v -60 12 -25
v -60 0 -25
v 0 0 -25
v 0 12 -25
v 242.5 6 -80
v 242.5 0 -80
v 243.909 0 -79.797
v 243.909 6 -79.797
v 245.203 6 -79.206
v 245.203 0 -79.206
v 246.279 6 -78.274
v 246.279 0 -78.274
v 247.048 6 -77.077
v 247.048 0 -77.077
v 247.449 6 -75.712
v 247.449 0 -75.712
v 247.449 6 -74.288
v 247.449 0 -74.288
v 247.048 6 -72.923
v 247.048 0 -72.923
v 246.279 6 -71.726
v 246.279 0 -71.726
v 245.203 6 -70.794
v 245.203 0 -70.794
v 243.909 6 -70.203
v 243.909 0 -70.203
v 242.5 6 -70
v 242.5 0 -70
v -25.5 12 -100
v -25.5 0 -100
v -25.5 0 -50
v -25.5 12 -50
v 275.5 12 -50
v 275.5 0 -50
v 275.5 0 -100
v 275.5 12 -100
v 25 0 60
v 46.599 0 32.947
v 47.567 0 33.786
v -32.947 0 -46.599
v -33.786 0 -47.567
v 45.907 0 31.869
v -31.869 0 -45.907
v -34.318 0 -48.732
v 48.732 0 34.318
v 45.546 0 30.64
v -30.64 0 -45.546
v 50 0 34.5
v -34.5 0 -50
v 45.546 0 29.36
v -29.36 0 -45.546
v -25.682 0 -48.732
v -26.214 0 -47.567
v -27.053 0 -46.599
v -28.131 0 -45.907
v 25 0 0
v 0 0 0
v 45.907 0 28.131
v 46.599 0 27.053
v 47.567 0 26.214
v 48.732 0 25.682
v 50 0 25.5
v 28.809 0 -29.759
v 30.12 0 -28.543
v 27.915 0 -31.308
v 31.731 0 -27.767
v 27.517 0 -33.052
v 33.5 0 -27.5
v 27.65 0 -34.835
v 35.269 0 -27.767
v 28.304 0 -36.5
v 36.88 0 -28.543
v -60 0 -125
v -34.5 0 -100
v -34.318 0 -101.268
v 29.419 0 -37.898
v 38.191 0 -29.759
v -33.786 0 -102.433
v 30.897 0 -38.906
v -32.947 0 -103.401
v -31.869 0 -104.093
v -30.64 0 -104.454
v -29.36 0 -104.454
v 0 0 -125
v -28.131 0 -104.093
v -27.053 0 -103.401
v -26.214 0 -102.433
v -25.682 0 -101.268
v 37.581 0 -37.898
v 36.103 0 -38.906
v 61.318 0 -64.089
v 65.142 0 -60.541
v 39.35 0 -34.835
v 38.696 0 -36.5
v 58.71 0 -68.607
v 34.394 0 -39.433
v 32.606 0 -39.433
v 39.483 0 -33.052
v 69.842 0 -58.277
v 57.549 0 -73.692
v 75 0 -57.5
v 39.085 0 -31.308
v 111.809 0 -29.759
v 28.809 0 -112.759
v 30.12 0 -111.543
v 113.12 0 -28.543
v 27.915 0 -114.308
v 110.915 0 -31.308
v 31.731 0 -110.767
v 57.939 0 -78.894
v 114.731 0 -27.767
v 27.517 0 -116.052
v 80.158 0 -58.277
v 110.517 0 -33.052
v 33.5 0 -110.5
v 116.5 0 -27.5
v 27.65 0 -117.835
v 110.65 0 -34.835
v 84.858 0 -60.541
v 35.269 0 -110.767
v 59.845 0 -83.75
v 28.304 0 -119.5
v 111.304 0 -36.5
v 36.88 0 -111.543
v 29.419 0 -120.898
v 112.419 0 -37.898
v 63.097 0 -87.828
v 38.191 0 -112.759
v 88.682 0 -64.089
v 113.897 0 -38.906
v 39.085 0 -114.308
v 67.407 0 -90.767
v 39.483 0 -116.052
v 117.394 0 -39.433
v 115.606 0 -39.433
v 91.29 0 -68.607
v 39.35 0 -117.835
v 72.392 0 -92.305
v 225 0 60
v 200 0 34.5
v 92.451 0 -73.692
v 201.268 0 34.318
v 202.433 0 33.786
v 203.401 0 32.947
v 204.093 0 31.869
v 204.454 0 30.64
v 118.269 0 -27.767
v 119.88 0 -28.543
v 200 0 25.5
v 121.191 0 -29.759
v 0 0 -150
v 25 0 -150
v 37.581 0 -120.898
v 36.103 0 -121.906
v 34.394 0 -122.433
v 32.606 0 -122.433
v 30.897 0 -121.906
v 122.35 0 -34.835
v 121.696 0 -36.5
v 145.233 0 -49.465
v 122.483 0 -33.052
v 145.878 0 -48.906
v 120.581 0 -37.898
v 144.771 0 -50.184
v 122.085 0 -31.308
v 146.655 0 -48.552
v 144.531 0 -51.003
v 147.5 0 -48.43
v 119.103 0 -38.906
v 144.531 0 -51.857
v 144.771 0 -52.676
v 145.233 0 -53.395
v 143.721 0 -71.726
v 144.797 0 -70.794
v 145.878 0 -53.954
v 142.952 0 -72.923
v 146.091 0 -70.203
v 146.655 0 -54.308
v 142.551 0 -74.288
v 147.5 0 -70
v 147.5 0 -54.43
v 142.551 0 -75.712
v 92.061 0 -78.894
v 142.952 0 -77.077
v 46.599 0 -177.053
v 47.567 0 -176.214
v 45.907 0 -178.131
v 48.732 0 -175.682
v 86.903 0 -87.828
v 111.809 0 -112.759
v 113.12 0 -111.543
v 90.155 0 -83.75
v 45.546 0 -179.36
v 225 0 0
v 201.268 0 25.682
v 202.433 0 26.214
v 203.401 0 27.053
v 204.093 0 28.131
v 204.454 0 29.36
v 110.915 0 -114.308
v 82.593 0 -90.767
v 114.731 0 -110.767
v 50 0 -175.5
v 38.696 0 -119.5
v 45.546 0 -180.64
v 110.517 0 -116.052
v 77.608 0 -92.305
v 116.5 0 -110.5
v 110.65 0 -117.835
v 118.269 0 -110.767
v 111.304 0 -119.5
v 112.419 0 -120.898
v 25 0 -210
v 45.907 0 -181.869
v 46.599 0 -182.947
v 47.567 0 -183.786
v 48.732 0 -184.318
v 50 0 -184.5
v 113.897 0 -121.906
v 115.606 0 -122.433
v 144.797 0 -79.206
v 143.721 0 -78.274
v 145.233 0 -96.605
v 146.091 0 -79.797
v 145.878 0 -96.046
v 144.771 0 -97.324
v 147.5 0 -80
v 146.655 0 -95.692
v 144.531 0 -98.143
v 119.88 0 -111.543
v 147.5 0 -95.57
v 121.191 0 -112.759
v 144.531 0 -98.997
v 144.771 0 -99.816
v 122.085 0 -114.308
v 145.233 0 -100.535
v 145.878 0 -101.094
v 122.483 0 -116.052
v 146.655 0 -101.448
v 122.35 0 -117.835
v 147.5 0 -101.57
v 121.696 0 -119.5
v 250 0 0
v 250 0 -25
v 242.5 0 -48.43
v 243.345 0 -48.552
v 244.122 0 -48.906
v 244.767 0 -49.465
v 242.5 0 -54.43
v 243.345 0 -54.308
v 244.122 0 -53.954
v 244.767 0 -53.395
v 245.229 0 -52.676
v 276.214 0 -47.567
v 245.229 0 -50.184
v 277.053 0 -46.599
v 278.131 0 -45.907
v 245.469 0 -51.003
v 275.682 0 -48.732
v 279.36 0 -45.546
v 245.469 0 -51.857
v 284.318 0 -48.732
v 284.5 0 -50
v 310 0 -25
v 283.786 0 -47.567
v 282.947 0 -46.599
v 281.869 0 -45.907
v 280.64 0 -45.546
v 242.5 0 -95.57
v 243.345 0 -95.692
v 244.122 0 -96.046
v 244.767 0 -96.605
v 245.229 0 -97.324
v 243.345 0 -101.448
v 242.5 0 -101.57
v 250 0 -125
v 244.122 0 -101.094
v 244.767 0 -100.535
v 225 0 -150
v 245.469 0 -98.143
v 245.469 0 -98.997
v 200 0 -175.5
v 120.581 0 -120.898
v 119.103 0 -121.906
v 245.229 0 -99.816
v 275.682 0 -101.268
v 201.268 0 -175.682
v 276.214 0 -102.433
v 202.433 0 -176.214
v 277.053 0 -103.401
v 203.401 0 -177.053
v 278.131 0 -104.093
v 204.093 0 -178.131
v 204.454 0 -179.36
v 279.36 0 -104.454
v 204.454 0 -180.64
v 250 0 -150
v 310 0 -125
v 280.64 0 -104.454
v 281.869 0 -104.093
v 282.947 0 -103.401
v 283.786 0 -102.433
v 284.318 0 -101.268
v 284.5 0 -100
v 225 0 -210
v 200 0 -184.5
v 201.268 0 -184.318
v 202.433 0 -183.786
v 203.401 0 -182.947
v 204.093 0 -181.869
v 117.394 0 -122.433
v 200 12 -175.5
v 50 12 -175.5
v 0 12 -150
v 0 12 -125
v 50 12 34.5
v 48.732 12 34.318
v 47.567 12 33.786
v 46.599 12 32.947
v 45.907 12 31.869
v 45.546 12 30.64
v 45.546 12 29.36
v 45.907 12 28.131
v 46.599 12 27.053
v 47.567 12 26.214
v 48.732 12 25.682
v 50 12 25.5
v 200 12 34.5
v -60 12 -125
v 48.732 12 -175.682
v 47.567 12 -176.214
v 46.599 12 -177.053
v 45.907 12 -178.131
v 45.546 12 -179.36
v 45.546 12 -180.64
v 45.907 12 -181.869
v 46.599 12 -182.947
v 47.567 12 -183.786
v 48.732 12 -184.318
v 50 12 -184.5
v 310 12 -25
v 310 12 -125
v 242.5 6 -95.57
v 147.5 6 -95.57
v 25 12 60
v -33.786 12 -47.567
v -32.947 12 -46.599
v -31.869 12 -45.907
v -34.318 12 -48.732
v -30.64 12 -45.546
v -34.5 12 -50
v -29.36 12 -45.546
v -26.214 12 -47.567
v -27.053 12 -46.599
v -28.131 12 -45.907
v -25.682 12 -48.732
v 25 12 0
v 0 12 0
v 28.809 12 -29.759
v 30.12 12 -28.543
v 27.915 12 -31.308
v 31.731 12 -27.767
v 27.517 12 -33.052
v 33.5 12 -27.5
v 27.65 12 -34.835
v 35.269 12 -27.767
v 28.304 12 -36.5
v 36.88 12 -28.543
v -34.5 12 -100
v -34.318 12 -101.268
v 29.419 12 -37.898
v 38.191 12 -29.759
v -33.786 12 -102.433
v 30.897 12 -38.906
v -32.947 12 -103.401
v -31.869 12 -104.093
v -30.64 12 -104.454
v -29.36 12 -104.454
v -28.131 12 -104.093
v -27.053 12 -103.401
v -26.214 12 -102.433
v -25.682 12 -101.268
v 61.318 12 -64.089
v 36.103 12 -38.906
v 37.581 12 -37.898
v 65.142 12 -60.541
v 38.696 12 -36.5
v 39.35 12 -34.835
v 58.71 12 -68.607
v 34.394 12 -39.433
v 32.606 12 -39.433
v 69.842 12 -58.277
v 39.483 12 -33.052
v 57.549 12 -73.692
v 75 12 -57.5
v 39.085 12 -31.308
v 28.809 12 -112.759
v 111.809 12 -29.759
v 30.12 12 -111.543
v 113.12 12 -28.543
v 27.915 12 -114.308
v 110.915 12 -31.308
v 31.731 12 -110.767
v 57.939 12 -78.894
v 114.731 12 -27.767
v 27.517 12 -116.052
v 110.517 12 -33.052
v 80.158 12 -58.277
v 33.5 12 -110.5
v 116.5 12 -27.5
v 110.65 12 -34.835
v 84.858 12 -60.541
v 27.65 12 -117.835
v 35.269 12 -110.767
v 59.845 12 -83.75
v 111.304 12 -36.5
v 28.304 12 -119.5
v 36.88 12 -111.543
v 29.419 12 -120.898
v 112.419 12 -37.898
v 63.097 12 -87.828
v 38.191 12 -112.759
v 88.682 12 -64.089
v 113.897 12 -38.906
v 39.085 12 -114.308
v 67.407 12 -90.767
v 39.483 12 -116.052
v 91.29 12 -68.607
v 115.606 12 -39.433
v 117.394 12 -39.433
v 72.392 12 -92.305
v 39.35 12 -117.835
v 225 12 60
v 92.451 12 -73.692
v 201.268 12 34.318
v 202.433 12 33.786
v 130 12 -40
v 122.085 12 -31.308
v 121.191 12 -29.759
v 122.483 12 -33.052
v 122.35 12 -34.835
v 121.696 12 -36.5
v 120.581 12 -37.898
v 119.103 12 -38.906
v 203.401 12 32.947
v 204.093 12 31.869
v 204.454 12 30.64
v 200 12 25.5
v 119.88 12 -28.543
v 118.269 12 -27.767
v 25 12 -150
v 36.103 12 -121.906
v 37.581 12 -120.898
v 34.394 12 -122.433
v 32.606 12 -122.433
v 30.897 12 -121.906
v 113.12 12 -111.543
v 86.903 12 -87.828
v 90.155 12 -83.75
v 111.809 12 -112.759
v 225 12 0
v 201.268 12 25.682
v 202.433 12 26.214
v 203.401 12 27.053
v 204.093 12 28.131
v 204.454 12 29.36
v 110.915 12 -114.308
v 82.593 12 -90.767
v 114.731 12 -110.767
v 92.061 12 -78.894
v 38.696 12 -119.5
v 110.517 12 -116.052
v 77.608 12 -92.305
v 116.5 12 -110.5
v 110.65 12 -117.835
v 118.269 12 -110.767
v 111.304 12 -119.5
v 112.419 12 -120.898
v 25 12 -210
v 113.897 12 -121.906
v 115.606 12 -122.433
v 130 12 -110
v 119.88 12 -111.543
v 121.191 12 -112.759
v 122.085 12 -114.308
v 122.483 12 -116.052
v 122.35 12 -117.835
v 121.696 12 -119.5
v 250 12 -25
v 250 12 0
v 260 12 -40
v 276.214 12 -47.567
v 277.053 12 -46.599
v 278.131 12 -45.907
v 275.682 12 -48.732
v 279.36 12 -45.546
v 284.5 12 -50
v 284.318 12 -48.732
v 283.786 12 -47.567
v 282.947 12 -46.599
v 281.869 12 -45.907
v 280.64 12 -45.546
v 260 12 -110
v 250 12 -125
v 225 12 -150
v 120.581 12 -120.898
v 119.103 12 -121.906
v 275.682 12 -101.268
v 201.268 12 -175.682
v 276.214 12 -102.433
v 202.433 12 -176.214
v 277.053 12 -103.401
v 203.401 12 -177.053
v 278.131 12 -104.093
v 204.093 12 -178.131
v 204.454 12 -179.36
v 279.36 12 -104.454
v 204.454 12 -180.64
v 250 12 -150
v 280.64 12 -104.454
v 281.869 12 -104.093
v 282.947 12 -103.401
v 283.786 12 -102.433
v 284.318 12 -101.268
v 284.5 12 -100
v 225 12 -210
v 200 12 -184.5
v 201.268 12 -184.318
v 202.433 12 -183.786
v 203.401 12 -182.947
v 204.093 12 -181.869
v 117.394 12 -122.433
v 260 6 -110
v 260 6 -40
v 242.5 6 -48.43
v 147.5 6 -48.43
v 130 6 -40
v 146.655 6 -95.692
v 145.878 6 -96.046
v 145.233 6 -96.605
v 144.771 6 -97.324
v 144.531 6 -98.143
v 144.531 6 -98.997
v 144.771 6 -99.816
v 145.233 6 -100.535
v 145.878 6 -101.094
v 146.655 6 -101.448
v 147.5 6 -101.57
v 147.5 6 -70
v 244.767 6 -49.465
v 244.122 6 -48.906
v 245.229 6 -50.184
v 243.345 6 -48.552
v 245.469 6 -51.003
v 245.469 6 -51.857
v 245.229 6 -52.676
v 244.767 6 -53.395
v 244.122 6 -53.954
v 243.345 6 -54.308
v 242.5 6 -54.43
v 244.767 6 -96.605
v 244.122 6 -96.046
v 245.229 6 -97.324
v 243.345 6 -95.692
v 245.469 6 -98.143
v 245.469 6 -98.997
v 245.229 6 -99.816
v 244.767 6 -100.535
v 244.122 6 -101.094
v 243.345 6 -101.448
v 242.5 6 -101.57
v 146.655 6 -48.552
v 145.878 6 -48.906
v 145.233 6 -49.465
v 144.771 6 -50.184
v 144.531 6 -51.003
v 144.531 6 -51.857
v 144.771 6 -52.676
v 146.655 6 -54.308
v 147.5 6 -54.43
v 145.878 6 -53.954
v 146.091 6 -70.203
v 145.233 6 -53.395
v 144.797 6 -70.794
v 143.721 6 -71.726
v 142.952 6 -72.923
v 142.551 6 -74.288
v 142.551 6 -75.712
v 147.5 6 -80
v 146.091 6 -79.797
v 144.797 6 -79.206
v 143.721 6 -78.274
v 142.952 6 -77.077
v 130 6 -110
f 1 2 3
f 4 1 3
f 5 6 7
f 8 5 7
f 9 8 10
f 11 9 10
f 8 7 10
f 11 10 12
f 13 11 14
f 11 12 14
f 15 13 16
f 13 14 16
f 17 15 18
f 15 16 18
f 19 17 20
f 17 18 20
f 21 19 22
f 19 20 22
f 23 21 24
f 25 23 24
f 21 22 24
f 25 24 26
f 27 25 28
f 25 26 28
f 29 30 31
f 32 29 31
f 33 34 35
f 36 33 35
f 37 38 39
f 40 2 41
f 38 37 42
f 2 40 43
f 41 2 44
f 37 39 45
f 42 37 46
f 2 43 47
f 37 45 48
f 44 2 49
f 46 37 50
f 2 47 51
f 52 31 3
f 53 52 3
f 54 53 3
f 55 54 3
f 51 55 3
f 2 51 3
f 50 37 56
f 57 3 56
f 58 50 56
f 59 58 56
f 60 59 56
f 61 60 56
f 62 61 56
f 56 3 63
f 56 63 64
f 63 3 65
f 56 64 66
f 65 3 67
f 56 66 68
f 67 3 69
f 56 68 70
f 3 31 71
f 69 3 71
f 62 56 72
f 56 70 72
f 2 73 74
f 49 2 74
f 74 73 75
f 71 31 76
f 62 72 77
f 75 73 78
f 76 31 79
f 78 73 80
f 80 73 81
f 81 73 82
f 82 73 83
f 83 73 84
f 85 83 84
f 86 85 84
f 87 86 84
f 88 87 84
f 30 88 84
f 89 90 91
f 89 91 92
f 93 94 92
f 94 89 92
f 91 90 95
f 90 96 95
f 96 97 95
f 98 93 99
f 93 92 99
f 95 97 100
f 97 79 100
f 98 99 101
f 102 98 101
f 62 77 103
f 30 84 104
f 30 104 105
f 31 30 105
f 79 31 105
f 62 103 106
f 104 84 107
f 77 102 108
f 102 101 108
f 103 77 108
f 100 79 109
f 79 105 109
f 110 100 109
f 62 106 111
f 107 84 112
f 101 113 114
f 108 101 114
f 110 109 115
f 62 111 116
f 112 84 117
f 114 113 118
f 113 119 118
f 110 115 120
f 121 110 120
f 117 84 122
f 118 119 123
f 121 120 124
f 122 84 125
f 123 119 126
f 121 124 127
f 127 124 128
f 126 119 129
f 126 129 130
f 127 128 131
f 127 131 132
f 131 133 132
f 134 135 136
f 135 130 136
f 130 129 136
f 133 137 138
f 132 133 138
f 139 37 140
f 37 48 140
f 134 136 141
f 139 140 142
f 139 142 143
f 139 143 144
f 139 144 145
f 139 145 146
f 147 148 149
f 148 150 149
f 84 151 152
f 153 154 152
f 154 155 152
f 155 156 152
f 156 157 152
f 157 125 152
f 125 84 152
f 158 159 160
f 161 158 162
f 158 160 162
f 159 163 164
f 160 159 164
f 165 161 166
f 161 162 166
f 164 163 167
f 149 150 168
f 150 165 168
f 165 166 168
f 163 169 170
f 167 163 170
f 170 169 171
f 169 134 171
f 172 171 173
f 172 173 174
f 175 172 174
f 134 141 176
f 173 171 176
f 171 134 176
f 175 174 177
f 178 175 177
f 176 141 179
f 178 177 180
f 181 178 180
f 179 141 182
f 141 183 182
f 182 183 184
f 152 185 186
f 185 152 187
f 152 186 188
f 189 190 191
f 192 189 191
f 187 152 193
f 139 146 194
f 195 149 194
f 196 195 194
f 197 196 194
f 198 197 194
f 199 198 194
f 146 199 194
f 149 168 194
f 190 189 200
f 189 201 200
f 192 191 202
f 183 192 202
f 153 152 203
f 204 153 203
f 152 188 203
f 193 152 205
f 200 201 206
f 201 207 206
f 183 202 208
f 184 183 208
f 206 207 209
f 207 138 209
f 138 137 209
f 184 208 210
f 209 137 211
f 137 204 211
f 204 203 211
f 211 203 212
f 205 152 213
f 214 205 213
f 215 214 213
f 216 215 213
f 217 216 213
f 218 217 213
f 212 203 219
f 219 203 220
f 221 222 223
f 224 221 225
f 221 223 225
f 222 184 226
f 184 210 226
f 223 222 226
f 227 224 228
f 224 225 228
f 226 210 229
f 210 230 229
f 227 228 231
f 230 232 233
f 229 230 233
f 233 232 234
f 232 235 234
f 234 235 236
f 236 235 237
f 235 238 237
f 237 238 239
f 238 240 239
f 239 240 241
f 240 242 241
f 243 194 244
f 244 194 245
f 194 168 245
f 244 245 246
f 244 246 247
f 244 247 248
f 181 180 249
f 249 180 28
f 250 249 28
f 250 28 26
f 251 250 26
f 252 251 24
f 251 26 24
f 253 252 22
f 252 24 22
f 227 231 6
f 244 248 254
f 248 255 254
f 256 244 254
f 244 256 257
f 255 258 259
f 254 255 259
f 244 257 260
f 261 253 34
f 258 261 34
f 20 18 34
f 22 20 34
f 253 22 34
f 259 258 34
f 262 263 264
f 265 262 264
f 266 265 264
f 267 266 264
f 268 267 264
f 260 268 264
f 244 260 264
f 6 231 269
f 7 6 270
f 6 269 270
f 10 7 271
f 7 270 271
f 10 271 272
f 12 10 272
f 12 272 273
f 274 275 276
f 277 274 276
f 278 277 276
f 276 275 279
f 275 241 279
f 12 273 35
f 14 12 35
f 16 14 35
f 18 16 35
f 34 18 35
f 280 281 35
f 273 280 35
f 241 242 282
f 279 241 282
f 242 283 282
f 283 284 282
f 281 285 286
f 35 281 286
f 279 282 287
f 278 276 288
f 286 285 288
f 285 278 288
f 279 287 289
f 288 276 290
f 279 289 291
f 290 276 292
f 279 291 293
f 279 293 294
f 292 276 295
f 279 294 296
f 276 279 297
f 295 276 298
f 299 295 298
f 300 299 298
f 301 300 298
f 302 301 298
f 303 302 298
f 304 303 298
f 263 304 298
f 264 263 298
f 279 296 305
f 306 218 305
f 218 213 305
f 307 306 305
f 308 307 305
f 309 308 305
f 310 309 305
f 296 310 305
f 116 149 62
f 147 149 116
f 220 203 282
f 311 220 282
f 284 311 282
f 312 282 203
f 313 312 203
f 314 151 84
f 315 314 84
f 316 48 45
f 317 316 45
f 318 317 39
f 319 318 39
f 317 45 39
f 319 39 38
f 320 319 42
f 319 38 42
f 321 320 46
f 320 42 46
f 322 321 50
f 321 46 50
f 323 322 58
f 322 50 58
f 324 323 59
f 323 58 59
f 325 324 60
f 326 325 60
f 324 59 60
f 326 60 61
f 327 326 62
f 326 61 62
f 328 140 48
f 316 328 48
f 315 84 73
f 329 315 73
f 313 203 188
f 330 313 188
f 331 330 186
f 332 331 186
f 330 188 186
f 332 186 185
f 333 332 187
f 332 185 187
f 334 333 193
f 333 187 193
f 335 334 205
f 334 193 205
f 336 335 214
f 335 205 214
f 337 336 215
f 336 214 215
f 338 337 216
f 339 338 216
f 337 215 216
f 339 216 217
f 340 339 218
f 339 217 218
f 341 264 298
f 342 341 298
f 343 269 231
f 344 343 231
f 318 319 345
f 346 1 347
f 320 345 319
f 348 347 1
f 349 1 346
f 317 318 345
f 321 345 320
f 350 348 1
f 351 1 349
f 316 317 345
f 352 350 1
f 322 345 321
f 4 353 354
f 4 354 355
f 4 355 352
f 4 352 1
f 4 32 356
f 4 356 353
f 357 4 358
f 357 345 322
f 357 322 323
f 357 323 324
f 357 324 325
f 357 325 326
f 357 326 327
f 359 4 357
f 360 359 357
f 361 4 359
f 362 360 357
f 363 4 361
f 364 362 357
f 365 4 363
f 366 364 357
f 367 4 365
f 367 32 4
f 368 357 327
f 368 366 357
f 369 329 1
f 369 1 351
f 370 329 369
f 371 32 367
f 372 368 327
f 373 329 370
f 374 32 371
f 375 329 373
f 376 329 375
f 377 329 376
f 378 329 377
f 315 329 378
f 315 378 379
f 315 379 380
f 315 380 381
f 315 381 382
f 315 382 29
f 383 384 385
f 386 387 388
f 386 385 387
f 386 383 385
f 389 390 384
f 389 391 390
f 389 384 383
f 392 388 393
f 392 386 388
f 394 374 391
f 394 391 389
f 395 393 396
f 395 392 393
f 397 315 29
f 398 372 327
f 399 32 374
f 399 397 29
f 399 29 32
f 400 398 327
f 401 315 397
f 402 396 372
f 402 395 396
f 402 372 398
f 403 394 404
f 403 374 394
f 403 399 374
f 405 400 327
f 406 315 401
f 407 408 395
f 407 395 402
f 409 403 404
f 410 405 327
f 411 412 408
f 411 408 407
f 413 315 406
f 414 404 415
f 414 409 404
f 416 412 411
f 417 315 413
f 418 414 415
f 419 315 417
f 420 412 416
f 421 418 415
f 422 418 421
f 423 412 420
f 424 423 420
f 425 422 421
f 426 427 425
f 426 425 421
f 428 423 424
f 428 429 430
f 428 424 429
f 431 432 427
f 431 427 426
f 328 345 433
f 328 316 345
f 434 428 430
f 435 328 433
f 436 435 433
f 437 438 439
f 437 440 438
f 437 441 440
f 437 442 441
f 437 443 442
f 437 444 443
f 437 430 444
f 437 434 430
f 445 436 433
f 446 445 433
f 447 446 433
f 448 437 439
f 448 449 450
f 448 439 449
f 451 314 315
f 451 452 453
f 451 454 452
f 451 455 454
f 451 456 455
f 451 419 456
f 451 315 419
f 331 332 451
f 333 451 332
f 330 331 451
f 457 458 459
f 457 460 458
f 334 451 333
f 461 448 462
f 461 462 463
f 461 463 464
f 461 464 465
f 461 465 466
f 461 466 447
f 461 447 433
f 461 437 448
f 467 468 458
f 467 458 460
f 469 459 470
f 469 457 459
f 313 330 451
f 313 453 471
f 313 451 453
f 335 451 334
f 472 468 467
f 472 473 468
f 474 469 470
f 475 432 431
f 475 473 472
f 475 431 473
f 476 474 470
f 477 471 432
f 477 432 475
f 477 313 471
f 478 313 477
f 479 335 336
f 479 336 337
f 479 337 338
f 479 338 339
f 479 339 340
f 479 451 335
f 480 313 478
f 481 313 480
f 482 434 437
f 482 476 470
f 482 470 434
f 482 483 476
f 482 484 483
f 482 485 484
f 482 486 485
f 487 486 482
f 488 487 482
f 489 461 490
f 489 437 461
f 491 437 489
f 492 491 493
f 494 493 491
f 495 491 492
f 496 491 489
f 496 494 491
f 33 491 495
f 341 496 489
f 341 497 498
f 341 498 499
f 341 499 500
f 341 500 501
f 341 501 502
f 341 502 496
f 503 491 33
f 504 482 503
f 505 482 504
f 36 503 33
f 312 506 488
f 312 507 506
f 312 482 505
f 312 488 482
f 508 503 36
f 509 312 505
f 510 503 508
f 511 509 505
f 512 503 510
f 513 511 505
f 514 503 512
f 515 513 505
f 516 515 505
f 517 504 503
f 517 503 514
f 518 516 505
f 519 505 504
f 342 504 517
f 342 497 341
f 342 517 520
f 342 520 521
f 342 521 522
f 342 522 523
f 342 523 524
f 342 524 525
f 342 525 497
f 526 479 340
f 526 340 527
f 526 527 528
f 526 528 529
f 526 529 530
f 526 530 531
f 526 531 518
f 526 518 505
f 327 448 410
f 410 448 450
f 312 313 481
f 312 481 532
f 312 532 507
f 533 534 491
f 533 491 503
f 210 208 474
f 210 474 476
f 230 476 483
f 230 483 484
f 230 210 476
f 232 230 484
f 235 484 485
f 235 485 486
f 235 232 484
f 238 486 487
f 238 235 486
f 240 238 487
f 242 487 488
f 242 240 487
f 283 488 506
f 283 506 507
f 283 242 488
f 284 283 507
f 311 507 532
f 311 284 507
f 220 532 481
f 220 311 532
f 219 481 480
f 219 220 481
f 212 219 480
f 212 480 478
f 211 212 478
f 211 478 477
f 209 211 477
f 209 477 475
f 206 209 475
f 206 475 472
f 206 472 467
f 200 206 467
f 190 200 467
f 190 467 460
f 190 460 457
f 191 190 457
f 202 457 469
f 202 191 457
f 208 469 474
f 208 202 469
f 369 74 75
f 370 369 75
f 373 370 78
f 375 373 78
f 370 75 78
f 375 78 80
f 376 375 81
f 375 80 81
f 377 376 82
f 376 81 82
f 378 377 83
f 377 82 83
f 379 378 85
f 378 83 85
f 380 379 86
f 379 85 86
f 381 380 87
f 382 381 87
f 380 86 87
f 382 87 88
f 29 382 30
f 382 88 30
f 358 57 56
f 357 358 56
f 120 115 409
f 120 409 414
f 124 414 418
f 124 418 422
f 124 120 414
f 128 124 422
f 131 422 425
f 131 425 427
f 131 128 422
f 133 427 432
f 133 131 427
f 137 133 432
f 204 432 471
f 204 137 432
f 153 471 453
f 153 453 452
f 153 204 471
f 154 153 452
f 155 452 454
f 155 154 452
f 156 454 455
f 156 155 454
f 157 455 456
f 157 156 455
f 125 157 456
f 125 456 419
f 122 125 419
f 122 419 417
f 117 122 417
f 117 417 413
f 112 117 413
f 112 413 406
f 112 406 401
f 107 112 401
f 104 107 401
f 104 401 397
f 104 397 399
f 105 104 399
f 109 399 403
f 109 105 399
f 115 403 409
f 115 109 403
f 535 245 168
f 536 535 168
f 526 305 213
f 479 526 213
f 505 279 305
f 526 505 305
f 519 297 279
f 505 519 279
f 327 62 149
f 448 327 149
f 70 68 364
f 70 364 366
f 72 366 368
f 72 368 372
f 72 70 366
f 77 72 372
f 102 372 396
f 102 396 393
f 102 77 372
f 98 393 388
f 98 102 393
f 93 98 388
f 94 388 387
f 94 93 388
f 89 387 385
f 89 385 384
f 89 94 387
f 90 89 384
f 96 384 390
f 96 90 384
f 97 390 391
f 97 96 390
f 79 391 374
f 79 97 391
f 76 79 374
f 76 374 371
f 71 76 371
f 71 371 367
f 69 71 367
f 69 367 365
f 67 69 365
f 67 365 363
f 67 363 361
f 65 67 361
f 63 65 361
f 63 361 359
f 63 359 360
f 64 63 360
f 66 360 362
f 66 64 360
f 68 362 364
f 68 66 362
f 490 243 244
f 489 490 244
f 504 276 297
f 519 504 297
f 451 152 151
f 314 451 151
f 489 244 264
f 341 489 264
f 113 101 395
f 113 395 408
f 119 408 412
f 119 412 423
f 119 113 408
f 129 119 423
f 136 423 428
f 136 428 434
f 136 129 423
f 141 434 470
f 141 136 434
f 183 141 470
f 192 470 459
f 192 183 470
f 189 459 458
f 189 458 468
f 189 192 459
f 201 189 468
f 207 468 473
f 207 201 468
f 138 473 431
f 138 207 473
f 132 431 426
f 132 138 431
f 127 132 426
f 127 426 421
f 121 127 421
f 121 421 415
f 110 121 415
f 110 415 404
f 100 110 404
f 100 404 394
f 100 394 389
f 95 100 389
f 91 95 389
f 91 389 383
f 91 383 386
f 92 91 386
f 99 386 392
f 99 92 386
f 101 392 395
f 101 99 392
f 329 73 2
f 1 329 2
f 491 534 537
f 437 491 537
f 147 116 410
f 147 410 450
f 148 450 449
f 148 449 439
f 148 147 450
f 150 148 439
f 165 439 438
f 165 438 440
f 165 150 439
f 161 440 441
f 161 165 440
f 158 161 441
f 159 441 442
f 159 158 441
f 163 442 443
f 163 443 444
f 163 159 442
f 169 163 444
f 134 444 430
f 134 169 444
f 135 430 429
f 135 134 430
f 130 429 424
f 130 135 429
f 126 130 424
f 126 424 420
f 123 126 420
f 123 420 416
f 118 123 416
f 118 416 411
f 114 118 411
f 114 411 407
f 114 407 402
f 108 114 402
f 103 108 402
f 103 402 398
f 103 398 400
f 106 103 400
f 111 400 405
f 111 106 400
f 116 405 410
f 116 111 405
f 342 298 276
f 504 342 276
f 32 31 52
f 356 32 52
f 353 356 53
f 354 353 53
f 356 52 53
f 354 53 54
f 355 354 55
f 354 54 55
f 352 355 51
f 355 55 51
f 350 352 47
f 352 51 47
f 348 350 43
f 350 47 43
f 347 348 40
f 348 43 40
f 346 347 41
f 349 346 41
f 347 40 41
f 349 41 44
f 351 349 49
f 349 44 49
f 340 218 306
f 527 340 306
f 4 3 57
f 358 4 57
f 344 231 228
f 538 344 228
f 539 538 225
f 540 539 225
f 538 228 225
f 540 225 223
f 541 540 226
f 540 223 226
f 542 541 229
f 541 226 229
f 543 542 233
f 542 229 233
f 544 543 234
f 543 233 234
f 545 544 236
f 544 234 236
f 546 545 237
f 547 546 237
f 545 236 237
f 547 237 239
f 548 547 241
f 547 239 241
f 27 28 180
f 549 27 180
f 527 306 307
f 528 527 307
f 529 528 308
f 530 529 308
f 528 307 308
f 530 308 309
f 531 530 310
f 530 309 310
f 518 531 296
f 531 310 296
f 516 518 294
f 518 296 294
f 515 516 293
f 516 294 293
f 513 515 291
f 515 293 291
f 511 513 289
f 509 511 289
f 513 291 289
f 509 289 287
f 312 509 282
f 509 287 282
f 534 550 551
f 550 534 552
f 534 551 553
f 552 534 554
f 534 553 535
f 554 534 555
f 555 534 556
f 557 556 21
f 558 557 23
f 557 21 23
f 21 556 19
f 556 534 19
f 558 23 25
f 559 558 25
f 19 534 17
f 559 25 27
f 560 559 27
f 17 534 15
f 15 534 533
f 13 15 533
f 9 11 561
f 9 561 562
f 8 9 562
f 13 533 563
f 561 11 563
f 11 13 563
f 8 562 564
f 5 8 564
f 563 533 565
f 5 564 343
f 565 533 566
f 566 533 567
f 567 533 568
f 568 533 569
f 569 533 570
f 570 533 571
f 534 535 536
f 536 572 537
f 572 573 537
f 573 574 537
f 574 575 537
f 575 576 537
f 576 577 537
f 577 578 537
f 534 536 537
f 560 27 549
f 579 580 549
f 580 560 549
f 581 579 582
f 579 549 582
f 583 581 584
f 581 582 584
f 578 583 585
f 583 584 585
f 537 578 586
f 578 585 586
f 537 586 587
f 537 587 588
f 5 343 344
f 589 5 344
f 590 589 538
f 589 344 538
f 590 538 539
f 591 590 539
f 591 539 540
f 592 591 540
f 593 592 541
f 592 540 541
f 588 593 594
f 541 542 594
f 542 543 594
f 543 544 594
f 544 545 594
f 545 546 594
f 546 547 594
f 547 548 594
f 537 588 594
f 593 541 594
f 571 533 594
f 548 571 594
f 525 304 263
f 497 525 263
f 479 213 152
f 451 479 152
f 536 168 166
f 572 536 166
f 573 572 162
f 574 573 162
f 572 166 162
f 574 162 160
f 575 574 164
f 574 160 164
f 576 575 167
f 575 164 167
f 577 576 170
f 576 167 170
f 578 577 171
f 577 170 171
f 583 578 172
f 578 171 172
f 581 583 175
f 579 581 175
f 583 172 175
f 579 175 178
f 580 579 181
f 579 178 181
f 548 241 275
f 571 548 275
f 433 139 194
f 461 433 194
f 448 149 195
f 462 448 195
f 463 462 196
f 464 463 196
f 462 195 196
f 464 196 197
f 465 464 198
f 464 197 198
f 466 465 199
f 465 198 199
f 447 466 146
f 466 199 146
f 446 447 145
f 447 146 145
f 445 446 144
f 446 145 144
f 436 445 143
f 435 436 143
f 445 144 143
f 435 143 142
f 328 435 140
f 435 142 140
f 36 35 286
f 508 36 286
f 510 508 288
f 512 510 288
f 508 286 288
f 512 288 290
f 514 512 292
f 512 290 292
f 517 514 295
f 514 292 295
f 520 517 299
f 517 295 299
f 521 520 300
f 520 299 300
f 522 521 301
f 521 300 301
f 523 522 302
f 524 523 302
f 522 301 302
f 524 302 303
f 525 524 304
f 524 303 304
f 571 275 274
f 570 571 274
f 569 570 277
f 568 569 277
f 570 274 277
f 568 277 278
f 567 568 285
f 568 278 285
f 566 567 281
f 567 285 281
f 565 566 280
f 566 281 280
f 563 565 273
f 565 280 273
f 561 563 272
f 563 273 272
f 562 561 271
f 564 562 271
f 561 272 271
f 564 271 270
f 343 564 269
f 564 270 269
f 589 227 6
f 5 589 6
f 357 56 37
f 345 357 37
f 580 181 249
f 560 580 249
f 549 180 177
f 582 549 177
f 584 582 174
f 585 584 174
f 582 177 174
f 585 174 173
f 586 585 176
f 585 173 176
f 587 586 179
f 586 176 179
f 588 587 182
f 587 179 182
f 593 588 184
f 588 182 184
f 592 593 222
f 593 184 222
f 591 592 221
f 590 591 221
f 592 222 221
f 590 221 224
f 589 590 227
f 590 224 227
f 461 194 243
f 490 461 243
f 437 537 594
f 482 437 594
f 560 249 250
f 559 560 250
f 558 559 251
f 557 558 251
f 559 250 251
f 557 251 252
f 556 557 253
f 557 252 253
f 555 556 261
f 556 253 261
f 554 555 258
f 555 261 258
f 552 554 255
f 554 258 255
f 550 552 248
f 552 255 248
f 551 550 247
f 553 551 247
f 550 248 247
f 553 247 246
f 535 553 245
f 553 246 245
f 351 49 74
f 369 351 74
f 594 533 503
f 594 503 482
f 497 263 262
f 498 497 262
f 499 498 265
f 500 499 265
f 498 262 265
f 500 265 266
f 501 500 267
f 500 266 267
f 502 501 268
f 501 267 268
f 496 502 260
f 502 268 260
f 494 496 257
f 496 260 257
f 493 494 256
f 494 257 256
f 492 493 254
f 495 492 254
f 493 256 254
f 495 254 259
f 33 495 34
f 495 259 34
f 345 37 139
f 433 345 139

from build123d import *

# Parameters (mm, degrees)
SKETCH1_R           = 17.5
SKETCH1_R_2         = 6
BOSS_EXTRUDE1_DEPTH = 12
CUT_EXTRUDE1_START  = -6
SKETCH2_W           = 130
SKETCH2_H           = 70
CUT_EXTRUDE1_DEPTH  = 6


with BuildPart() as part:
    # Sketch1 → Boss-Extrude1 (new body)
    with BuildSketch(Plane(origin=(0, 0, 0), x_dir=(1, 0, 0), z_dir=(0, 1, 0))):
        Polygon((0, 0), (25, 0), (25, -60), (225, -60), (225, 0), (250, 0), (250, 25), (310, 25), (310, 125), (250, 125), (250, 150), (225, 150), (225, 210), (25, 210), (25, 150), (0, 150), (0, 125), (-60, 125), (-60, 25), (0, 25), align=None)
        with Locations(Location((75, 75, 0), (0, 0, 270))):
            Circle(SKETCH1_R, mode=Mode.SUBTRACT)
        with Locations(Location((33.5, 33.5, 0), (0, 0, 270))):
            Circle(SKETCH1_R_2, mode=Mode.SUBTRACT)
        with Locations(Location((116.5, 33.5, 0), (0, 0, 270))):
            Circle(SKETCH1_R_2, mode=Mode.SUBTRACT)
        with Locations(Location((116.5, 116.5, 0), (0, 0, 270))):
            Circle(SKETCH1_R_2, mode=Mode.SUBTRACT)
        with Locations(Location((33.5, 116.5, 0), (0, 0, 270))):
            Circle(SKETCH1_R_2, mode=Mode.SUBTRACT)
        with BuildLine():
            Line((-25.5, 100), (-25.5, 50))
            ThreePointArc((-25.5, 50), (-30, 45.5), (-34.5, 50))
            Line((-34.5, 50), (-34.5, 100))
            ThreePointArc((-34.5, 100), (-30, 104.5), (-25.5, 100))
        make_face(mode=Mode.SUBTRACT)
        with BuildLine():
            Line((50, 184.5), (200, 184.5))
            ThreePointArc((200, 184.5), (204.5, 180), (200, 175.5))
            Line((200, 175.5), (50, 175.5))
            ThreePointArc((50, 175.5), (45.5, 180), (50, 184.5))
        make_face(mode=Mode.SUBTRACT)
        with BuildLine():
            Line((50, -25.5), (200, -25.5))
            ThreePointArc((200, -25.5), (204.5, -30), (200, -34.5))
            Line((200, -34.5), (50, -34.5))
            ThreePointArc((50, -34.5), (45.5, -30), (50, -25.5))
        make_face(mode=Mode.SUBTRACT)
        with BuildLine():
            Line((275.5, 50), (275.5, 100))
            ThreePointArc((275.5, 100), (280, 104.5), (284.5, 100))
            Line((284.5, 100), (284.5, 50))
            ThreePointArc((284.5, 50), (280, 45.5), (275.5, 50))
        make_face(mode=Mode.SUBTRACT)
        with BuildLine():
            Line((147.5, 54.43), (242.5, 54.43))
            ThreePointArc((242.5, 54.43), (245.5, 51.43), (242.5, 48.43))
            Line((242.5, 48.43), (147.5, 48.43))
            ThreePointArc((147.5, 48.43), (144.5, 51.43), (147.5, 54.43))
        make_face(mode=Mode.SUBTRACT)
        with BuildLine():
            Line((147.5, 101.57), (242.5, 101.57))
            ThreePointArc((242.5, 101.57), (245.5, 98.57), (242.5, 95.57))
            Line((242.5, 95.57), (147.5, 95.57))
            ThreePointArc((147.5, 95.57), (144.5, 98.57), (147.5, 101.57))
        make_face(mode=Mode.SUBTRACT)
        with BuildLine():
            Line((147.5, 80), (242.5, 80))
            ThreePointArc((242.5, 80), (247.5, 75), (242.5, 70))
            Line((242.5, 70), (147.5, 70))
            ThreePointArc((147.5, 70), (142.5, 75), (147.5, 80))
        make_face(mode=Mode.SUBTRACT)
    extrude(amount=BOSS_EXTRUDE1_DEPTH)

    # Sketch2 → Cut-Extrude1 (cut)
    with BuildSketch(Plane(origin=(0, 0, 0), x_dir=(-1, 0, 0), z_dir=(0, -1, 0)).offset(CUT_EXTRUDE1_START)):
        with Locations((-195, 75)):
            Rectangle(SKETCH2_W, SKETCH2_H)
    extrude(amount=-CUT_EXTRUDE1_DEPTH, mode=Mode.SUBTRACT)


solid = part.part
